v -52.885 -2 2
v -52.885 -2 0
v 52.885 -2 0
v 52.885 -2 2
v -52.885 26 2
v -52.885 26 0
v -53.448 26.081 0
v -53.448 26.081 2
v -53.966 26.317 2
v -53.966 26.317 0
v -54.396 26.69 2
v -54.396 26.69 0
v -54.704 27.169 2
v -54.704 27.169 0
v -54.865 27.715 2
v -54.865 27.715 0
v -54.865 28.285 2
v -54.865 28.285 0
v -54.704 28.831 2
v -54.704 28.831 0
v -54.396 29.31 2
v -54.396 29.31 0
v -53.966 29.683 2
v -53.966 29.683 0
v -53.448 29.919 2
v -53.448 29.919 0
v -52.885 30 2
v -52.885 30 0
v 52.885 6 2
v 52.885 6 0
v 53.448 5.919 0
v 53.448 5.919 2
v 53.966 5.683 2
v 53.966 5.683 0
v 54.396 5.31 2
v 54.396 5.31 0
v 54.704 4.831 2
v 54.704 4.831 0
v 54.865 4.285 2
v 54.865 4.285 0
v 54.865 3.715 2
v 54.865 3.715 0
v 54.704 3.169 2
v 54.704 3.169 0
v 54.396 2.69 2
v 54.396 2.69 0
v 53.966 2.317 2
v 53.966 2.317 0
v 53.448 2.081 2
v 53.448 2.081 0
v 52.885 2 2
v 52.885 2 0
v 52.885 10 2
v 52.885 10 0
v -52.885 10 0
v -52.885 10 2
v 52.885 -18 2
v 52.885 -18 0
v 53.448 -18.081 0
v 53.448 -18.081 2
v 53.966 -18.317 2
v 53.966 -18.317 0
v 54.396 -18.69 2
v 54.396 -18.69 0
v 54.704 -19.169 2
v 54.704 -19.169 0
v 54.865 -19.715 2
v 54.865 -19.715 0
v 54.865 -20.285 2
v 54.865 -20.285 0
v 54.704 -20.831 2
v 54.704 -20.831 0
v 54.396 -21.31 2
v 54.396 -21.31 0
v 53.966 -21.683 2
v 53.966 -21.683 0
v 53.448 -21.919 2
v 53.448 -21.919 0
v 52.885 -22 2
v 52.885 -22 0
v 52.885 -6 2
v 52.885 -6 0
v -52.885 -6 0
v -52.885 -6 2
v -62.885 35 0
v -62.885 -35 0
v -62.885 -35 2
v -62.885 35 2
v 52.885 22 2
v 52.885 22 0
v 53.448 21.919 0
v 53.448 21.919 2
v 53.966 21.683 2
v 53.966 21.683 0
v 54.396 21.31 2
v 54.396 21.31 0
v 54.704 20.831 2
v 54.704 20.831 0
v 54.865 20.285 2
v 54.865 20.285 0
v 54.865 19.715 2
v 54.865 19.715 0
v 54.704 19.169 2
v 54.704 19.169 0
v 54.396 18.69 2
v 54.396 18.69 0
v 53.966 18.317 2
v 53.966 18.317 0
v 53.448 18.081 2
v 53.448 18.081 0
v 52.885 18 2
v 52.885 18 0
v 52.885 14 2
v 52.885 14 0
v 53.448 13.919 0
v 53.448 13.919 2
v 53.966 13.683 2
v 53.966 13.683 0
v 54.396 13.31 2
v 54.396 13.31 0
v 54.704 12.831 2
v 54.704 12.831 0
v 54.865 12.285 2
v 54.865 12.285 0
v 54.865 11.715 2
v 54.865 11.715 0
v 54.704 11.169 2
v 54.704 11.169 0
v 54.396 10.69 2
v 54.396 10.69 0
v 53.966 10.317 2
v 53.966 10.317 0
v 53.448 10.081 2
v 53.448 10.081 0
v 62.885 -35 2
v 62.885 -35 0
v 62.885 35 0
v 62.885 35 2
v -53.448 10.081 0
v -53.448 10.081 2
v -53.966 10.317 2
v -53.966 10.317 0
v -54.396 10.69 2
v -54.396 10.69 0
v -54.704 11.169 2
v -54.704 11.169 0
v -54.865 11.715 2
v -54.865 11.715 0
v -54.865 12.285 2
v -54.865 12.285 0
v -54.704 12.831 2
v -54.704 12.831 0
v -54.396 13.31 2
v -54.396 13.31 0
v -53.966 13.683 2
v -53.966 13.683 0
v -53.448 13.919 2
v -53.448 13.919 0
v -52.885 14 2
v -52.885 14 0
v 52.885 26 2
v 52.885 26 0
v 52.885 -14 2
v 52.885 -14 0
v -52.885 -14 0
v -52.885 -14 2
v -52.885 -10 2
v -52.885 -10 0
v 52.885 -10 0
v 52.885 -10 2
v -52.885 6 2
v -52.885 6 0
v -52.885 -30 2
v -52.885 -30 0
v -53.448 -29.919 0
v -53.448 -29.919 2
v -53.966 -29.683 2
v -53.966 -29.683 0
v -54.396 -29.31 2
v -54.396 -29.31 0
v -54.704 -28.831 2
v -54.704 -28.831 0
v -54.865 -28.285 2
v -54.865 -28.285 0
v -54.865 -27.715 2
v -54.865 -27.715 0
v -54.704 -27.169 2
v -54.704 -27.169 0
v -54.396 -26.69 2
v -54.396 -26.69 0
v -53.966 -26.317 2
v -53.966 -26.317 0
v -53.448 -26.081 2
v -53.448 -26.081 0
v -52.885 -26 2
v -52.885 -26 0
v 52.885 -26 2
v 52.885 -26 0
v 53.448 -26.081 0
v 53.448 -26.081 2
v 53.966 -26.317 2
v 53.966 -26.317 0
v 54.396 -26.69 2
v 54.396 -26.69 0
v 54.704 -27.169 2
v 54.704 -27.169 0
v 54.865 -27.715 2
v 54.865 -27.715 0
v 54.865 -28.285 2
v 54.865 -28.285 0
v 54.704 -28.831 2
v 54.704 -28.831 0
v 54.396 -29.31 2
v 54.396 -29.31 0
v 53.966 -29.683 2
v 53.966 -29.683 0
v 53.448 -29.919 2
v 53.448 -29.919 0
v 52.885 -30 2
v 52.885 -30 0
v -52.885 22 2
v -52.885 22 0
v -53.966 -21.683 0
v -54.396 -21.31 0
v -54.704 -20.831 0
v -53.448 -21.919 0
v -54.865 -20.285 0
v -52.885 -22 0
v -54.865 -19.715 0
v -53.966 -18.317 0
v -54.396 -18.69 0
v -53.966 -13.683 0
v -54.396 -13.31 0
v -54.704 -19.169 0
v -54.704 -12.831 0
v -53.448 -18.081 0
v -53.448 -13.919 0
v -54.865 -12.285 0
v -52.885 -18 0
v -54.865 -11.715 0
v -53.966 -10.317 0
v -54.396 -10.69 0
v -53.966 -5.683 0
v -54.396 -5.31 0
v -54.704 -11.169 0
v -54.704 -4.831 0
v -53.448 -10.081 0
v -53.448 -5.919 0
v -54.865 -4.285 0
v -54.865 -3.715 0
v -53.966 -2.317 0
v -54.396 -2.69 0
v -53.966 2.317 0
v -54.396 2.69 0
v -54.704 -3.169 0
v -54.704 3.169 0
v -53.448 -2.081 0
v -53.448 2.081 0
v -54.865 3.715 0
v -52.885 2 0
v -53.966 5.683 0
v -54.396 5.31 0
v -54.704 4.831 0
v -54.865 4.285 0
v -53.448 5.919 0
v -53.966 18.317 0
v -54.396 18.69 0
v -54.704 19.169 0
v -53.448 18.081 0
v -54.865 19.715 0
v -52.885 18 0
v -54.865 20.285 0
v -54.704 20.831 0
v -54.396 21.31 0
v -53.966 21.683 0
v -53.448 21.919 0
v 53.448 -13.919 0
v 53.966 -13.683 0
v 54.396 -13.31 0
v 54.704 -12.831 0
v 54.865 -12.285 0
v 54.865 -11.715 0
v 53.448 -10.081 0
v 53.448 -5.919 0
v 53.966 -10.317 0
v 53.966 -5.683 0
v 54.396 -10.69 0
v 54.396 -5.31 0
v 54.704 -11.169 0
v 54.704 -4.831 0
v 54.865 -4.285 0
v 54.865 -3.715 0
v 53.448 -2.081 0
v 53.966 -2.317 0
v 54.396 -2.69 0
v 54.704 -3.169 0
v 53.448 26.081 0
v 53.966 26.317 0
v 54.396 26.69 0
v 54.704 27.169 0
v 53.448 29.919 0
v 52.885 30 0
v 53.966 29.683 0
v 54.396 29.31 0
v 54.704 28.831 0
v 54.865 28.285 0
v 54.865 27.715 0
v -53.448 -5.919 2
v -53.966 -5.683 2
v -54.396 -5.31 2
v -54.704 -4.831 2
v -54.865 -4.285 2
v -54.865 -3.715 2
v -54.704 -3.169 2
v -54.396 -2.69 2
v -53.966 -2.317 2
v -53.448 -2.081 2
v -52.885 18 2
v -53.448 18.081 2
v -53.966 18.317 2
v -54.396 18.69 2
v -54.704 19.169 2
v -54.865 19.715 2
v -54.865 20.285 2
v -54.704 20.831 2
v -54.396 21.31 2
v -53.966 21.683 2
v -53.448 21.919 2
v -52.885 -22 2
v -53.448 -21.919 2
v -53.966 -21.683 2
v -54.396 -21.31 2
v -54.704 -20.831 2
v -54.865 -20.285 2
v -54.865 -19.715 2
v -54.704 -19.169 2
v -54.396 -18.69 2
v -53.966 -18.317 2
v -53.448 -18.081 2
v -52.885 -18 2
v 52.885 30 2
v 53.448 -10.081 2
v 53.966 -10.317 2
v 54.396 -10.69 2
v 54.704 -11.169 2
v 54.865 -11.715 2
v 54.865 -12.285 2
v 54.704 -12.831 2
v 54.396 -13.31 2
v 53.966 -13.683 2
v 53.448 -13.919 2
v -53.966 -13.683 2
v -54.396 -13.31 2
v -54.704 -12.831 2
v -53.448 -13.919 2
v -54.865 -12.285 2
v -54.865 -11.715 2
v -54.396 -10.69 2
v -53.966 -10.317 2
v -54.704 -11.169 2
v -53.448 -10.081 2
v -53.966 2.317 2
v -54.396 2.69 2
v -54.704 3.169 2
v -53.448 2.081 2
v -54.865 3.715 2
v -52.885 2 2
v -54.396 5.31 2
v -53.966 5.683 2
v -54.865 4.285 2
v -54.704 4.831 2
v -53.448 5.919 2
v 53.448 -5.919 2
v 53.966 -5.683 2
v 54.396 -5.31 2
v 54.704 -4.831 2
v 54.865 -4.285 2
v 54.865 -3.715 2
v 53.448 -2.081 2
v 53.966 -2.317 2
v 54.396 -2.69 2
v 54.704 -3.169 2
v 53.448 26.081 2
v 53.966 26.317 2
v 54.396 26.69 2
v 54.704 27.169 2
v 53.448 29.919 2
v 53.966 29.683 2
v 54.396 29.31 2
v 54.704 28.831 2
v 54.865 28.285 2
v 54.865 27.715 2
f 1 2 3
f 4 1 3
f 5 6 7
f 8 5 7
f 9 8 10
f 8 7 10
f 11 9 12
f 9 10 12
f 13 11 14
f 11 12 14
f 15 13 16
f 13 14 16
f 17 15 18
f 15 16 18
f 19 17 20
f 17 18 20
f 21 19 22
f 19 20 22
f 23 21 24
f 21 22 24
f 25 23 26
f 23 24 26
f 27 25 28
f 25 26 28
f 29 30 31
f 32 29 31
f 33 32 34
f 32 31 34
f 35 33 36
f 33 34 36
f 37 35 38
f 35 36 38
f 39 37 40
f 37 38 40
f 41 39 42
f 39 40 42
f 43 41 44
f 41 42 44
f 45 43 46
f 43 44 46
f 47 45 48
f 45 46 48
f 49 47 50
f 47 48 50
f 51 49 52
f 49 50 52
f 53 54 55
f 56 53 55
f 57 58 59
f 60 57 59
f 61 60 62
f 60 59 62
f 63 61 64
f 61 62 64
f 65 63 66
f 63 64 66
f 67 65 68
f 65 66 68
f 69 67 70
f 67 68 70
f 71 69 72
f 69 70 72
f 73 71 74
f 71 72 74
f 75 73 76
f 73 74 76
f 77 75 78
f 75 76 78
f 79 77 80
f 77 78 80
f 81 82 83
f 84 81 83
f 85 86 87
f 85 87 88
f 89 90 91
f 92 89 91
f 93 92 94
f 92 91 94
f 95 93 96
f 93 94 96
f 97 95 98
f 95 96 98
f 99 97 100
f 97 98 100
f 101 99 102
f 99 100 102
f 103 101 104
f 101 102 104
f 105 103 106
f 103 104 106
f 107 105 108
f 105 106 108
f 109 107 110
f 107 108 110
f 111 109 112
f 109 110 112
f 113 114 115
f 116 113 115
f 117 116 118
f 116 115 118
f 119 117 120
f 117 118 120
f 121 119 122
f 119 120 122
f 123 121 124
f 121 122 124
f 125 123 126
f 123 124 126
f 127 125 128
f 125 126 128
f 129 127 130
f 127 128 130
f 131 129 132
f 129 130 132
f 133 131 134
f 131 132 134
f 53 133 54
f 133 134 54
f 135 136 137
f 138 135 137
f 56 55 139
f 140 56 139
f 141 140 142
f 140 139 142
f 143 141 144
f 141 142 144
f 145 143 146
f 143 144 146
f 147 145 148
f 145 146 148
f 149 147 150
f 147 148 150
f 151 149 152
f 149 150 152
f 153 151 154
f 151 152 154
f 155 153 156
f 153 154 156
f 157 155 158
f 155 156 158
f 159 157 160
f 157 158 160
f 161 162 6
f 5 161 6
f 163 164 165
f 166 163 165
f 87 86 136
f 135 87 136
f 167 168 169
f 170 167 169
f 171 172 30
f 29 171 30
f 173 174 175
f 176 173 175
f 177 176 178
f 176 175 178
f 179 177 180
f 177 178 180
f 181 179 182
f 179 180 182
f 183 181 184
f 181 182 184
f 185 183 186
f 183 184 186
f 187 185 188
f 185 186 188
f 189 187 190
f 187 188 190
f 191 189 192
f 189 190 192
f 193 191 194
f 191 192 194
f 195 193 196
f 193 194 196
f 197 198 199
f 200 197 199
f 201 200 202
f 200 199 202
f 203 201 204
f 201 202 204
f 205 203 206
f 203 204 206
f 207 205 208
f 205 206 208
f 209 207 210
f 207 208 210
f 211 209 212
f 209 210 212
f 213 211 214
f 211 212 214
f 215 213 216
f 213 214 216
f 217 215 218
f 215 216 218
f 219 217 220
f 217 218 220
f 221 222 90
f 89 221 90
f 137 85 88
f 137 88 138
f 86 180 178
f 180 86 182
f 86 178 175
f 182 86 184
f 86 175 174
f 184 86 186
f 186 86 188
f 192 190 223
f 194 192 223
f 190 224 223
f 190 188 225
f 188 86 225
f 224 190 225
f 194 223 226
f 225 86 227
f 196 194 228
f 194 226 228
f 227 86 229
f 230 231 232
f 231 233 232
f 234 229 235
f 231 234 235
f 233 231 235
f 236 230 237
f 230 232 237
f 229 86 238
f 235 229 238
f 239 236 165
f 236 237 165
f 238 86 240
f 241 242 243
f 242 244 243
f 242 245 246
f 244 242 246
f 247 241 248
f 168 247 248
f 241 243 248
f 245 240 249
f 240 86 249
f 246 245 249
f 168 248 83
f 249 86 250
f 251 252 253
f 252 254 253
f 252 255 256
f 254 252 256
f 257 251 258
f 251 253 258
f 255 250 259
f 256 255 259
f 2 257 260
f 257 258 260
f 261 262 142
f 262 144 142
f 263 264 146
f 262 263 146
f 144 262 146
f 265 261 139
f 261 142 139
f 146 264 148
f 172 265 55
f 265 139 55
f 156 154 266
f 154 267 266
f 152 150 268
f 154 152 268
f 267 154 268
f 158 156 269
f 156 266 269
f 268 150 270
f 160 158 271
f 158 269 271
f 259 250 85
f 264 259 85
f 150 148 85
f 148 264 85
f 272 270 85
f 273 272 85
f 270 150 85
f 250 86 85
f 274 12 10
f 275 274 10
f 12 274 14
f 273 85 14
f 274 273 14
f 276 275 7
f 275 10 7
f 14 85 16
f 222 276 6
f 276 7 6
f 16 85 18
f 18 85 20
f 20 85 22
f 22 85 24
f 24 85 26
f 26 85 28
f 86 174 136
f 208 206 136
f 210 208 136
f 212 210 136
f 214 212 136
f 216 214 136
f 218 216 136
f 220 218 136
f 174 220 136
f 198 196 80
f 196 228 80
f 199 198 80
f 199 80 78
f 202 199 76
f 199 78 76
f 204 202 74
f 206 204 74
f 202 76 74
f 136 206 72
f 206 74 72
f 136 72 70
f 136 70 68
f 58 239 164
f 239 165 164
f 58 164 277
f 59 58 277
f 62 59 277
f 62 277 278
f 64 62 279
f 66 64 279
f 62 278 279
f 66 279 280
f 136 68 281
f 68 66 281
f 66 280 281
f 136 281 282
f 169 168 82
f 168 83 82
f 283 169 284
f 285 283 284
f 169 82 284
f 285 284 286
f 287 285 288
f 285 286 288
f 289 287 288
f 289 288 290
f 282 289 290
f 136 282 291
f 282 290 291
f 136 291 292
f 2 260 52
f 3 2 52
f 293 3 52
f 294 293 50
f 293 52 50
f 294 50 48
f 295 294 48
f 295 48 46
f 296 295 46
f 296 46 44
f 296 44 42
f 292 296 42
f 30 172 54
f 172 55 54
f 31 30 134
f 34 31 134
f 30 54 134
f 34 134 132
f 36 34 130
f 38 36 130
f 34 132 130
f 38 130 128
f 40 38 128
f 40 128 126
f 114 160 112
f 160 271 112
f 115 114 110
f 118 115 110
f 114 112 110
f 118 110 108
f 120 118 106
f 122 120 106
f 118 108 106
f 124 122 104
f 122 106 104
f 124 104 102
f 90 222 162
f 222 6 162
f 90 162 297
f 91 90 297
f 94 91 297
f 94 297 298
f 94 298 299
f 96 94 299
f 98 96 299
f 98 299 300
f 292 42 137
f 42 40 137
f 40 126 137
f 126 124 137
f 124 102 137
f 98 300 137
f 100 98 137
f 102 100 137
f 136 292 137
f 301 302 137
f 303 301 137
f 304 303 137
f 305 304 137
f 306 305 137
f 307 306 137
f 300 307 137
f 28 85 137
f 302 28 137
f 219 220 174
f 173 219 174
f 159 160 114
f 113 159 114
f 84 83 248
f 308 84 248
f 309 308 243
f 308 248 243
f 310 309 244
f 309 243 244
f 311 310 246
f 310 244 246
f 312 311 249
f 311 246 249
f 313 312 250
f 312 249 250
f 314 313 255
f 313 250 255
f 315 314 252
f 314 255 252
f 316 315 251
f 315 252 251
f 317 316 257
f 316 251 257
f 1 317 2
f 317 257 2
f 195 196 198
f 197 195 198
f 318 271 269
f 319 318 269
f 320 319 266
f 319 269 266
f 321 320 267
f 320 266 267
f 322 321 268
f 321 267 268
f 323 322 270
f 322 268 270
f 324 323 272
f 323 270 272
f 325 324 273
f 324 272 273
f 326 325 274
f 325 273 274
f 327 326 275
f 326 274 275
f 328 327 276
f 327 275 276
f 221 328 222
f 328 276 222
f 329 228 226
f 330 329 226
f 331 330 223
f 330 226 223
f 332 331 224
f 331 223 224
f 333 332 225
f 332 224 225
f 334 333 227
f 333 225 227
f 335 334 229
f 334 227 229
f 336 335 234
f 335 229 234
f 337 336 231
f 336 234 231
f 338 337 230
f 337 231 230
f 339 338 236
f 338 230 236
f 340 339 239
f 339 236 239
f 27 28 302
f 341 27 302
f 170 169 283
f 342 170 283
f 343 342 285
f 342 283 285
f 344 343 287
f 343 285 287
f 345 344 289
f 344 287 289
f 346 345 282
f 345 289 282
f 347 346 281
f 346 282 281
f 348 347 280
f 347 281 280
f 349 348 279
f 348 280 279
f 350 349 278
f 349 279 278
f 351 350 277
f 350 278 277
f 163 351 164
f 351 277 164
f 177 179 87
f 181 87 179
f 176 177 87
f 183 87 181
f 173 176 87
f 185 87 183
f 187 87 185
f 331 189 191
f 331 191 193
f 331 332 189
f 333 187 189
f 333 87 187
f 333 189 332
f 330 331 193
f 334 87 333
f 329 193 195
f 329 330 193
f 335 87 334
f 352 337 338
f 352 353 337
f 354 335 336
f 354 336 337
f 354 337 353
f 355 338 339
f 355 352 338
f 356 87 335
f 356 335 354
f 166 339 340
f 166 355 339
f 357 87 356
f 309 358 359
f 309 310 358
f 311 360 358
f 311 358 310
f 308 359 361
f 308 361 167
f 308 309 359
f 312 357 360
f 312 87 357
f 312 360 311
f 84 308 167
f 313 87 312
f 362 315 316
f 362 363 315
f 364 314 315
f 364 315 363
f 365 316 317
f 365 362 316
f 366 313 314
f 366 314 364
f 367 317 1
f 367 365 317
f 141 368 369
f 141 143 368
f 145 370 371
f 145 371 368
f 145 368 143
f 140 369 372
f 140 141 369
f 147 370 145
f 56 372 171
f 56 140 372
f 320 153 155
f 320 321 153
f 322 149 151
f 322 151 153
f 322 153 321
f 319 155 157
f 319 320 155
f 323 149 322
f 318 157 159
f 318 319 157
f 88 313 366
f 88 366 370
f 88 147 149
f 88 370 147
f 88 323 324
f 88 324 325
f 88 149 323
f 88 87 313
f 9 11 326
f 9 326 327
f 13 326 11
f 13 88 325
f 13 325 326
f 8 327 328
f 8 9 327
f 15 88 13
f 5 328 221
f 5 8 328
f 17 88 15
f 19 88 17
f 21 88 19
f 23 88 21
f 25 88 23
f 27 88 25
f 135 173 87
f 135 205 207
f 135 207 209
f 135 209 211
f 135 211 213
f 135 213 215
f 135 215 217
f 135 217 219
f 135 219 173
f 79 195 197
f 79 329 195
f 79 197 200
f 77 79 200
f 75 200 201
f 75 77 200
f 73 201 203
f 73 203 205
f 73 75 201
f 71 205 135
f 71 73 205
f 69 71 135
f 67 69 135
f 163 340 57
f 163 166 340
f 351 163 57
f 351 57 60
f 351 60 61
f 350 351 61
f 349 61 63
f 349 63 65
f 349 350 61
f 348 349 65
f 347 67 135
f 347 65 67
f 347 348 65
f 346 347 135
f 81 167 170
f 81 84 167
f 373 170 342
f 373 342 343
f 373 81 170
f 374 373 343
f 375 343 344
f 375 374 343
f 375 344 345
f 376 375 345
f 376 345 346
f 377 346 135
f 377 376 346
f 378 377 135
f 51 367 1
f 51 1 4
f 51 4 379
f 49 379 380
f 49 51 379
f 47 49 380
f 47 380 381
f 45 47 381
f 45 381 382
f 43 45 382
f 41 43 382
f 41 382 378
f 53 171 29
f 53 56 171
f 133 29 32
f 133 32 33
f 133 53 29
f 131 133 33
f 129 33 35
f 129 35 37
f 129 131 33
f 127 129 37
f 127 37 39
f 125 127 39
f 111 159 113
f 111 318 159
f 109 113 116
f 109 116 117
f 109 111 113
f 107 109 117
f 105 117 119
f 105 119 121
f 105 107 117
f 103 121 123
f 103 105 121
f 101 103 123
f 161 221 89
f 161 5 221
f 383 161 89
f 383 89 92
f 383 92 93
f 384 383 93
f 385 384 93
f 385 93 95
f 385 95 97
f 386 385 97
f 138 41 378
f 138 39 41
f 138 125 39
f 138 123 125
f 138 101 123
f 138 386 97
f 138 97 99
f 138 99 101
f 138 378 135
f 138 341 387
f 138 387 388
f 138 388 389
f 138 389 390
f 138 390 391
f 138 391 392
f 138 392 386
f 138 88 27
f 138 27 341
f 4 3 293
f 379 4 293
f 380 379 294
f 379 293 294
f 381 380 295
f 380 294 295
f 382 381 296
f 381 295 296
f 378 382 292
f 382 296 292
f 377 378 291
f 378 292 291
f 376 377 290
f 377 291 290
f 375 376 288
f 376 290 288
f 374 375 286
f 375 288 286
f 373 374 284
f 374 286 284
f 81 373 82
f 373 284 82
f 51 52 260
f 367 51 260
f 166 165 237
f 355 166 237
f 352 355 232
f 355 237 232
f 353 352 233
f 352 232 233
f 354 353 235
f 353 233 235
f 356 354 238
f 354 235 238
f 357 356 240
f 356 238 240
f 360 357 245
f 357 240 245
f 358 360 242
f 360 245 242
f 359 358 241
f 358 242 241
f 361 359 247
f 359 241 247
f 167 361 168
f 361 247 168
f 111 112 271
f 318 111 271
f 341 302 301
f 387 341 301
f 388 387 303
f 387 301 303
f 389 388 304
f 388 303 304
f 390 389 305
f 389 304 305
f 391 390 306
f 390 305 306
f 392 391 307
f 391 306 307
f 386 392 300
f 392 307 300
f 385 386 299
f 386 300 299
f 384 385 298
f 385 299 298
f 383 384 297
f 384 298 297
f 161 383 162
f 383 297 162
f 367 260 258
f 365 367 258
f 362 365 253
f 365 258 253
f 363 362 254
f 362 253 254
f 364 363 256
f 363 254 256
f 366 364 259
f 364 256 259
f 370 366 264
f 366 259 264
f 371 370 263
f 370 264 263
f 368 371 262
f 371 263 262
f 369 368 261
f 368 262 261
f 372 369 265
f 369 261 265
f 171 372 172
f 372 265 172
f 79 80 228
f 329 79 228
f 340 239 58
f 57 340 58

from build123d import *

# Parameters (mm, degrees)
SKETCH_1_W      = 125.77
SKETCH_1_H      = 70
EXTRUDE_1_DEPTH = 2


with BuildPart() as part:
    # 草图1 → 凸台-拉伸1 (new body)
    with BuildSketch(Plane.XY):
        Rectangle(SKETCH_1_W, SKETCH_1_H)
        with BuildLine():
            Line((-52.885, -18), (52.885, -18))
            ThreePointArc((52.885, -18), (54.885, -20), (52.885, -22))
            Line((52.885, -22), (-52.885, -22))
            ThreePointArc((-52.885, -22), (-54.885, -20), (-52.885, -18))
        make_face(mode=Mode.SUBTRACT)
        with BuildLine():
            Line((-52.885, -10), (52.885, -10))
            ThreePointArc((52.885, -10), (54.885, -12), (52.885, -14))
            Line((52.885, -14), (-52.885, -14))
            ThreePointArc((-52.885, -14), (-54.885, -12), (-52.885, -10))
        make_face(mode=Mode.SUBTRACT)
        with BuildLine():
            Line((-52.885, -2), (52.885, -2))
            ThreePointArc((52.885, -2), (54.885, -4), (52.885, -6))
            Line((52.885, -6), (-52.885, -6))
            ThreePointArc((-52.885, -6), (-54.885, -4), (-52.885, -2))
        make_face(mode=Mode.SUBTRACT)
        with BuildLine():
            Line((-52.885, 6), (52.885, 6))
            ThreePointArc((52.885, 6), (54.885, 4), (52.885, 2))
            Line((52.885, 2), (-52.885, 2))
            ThreePointArc((-52.885, 2), (-54.885, 4), (-52.885, 6))
        make_face(mode=Mode.SUBTRACT)
        with BuildLine():
            Line((-52.885, 14), (52.885, 14))
            ThreePointArc((52.885, 14), (54.885, 12), (52.885, 10))
            Line((52.885, 10), (-52.885, 10))
            ThreePointArc((-52.885, 10), (-54.885, 12), (-52.885, 14))
        make_face(mode=Mode.SUBTRACT)
        with BuildLine():
            Line((-52.885, 22), (52.885, 22))
            ThreePointArc((52.885, 22), (54.885, 20), (52.885, 18))
            Line((52.885, 18), (-52.885, 18))
            ThreePointArc((-52.885, 18), (-54.885, 20), (-52.885, 22))
        make_face(mode=Mode.SUBTRACT)
        with BuildLine():
            Line((-52.885, 30), (52.885, 30))
            ThreePointArc((52.885, 30), (54.885, 28), (52.885, 26))
            Line((52.885, 26), (-52.885, 26))
            ThreePointArc((-52.885, 26), (-54.885, 28), (-52.885, 30))
        make_face(mode=Mode.SUBTRACT)
        with BuildLine():
            Line((-52.885, -26), (52.885, -26))
            ThreePointArc((52.885, -26), (54.885, -28), (52.885, -30))
            Line((52.885, -30), (-52.885, -30))
            ThreePointArc((-52.885, -30), (-54.885, -28), (-52.885, -26))
        make_face(mode=Mode.SUBTRACT)
    extrude(amount=EXTRUDE_1_DEPTH)


solid = part.part
